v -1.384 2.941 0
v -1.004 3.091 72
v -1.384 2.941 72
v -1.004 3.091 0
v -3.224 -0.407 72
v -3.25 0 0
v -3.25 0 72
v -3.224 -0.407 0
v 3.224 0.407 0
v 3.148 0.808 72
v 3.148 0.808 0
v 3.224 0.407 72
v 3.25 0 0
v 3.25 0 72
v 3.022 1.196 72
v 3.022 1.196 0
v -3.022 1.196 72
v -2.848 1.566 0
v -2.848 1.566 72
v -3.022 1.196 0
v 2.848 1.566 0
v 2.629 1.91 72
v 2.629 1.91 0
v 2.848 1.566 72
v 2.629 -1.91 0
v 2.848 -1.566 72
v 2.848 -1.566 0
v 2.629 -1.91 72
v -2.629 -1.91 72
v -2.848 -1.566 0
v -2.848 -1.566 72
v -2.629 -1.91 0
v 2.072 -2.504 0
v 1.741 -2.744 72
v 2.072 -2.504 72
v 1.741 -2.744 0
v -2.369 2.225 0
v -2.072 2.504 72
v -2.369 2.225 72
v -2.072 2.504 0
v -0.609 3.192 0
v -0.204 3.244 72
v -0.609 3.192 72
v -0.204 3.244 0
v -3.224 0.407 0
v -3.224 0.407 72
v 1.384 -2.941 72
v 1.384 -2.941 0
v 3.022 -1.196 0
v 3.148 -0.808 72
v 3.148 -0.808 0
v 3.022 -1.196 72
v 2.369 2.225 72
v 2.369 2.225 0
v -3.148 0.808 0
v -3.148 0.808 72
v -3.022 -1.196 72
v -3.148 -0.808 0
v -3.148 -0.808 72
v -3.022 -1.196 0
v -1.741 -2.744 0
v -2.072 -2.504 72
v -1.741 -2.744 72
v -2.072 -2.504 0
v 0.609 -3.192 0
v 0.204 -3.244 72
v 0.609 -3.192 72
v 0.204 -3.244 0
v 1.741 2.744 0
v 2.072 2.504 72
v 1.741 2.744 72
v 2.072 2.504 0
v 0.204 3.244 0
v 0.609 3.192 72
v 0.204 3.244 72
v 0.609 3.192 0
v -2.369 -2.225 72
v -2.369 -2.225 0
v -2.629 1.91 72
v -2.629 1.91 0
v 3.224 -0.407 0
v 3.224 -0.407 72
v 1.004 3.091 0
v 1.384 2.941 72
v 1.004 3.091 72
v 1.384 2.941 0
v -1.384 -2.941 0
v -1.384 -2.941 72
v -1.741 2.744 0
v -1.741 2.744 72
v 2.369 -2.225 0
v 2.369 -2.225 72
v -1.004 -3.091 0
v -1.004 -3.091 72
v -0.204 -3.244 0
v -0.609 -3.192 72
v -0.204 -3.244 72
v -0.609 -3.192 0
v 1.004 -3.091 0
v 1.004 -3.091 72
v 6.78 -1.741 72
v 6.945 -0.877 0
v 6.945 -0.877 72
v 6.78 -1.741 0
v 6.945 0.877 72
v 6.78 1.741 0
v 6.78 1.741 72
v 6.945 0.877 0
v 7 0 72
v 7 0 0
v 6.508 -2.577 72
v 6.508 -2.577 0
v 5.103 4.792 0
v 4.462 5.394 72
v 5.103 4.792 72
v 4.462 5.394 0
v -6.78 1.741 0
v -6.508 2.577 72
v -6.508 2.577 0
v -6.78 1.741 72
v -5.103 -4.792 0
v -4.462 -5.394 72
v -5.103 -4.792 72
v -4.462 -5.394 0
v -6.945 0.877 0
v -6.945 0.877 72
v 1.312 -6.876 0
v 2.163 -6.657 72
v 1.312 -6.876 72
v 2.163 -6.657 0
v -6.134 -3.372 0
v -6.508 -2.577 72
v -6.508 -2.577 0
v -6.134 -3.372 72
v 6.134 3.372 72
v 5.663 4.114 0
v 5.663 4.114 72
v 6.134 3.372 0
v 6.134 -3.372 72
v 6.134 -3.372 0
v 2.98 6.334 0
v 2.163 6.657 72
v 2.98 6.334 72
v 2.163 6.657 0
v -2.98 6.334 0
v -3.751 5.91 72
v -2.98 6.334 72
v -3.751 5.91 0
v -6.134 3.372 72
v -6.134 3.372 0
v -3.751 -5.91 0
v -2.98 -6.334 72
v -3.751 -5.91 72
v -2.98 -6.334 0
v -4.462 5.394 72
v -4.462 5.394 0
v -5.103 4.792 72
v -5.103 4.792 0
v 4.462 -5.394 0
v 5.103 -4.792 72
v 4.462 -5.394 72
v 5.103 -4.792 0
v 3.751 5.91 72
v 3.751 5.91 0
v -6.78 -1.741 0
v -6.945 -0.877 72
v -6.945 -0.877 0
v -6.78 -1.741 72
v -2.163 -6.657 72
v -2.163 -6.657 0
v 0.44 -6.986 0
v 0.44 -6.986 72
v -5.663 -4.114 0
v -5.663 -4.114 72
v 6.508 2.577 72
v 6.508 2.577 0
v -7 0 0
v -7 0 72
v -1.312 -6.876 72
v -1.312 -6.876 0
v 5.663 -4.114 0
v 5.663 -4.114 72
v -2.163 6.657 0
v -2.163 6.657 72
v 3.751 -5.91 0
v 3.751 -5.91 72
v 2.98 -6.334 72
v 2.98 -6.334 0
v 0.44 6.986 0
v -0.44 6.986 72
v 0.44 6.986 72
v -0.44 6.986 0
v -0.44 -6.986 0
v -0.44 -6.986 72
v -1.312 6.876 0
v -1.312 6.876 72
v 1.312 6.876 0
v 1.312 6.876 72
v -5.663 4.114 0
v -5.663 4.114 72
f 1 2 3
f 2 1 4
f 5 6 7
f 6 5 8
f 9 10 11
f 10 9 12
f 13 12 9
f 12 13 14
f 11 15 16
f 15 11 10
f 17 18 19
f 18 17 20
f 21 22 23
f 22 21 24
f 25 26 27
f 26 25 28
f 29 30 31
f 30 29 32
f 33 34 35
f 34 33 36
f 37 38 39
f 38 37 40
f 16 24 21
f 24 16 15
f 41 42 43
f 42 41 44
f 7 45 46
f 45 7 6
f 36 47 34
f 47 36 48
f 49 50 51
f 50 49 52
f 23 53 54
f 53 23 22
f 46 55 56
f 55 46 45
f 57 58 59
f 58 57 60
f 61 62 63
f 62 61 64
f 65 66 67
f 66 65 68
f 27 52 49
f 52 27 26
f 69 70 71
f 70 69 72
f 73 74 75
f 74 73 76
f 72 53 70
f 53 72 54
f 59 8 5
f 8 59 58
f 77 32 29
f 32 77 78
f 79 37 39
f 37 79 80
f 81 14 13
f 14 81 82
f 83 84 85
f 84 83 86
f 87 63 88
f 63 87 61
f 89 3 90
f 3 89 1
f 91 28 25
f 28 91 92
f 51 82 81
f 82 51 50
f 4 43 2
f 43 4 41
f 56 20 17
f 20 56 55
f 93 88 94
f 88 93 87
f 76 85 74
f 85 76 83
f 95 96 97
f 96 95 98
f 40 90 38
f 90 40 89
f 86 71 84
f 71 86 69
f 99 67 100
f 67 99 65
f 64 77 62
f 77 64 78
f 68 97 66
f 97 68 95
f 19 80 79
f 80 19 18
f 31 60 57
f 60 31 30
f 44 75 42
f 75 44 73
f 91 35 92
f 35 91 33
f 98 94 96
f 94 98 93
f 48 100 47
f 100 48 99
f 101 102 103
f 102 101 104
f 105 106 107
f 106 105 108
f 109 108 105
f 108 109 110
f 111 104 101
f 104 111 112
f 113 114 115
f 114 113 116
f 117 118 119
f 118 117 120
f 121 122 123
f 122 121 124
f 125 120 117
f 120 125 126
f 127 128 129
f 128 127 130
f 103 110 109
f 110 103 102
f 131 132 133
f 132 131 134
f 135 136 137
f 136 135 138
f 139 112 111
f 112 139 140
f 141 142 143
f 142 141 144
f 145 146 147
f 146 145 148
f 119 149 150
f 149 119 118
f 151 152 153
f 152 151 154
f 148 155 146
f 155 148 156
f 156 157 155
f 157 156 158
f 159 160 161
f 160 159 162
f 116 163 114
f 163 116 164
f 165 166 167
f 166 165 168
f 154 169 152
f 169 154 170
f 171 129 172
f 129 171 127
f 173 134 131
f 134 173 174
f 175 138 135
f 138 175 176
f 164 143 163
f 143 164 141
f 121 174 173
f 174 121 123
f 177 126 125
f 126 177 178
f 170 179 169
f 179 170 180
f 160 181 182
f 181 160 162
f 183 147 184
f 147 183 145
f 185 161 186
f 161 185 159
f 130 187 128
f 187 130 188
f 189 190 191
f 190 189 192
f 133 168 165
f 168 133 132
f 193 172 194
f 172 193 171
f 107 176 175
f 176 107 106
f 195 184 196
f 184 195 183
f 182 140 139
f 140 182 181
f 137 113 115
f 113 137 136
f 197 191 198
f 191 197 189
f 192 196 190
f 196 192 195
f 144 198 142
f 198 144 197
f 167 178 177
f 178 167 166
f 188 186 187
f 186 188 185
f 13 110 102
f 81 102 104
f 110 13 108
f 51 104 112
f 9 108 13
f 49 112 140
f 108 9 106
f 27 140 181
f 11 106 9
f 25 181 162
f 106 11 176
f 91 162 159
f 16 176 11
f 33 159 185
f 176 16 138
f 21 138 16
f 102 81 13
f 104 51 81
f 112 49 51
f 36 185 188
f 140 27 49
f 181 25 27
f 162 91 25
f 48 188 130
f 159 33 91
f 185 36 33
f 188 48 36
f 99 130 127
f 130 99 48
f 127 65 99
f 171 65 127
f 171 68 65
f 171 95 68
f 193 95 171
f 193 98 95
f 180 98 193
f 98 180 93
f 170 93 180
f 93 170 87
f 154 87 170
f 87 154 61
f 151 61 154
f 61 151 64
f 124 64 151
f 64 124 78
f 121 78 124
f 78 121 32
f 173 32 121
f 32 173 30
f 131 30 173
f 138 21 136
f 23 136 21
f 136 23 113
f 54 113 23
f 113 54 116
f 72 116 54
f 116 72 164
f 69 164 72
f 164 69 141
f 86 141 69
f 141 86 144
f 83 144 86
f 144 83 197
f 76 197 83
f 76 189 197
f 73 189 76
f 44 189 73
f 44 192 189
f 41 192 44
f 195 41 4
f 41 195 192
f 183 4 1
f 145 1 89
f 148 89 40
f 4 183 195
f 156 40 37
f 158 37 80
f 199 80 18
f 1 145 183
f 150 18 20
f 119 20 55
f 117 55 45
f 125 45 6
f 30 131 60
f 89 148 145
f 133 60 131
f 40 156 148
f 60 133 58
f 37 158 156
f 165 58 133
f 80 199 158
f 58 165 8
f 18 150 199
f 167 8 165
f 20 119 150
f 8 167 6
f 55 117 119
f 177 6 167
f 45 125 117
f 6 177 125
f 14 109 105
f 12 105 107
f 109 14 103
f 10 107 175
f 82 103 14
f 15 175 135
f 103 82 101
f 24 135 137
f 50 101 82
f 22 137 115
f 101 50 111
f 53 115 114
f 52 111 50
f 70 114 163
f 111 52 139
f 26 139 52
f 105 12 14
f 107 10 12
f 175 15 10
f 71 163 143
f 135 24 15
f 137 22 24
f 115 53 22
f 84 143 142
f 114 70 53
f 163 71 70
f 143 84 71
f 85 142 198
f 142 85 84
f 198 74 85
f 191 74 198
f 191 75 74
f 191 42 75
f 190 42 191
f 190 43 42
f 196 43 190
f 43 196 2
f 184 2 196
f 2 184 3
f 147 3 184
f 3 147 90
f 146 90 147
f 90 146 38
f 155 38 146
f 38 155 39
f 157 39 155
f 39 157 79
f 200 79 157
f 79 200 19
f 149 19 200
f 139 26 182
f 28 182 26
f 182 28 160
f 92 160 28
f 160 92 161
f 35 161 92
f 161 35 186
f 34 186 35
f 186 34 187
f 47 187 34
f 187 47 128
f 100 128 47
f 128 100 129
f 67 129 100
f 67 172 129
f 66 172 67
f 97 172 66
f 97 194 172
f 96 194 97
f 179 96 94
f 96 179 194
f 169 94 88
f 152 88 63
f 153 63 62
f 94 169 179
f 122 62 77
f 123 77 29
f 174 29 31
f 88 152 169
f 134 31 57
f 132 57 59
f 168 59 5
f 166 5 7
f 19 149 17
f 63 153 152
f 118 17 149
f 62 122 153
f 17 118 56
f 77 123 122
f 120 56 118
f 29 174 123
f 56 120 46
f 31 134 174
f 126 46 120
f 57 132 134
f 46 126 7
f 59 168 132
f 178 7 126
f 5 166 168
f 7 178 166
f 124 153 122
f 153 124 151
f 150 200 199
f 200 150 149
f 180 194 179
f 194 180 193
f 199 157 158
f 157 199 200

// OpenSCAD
$fn = 50;


difference() {
	union() {
		*color(alpha = 1.0000000000, c = "gray") {
			translate(v = [0, 7, 0]) {
				linear_extrude(height = 1) {
					text(font = "Arial:style=Bold", halign = "center", size = 4.5000000000, text = "COMMENT plate main", valign = "center");
				}
			}
		}
		cylinder(h = 72, r = 7.0000000000);
	}
	union() {
		*color(alpha = 1.0000000000, c = "gray") {
			translate(v = [0, 7, 0]) {
				linear_extrude(height = 1) {
					text(font = "Arial:style=Bold", halign = "center", size = 4.5000000000, text = "COMMENT holes main", valign = "center");
				}
			}
		}
		translate(v = [0, 0, -100]) {
			cylinder(h = 200, r = 3.2500000000);
		}
		translate(v = [0, 0, -100]) {
			cylinder(h = 200, r = 1.8000000000);
		}
	}
}
